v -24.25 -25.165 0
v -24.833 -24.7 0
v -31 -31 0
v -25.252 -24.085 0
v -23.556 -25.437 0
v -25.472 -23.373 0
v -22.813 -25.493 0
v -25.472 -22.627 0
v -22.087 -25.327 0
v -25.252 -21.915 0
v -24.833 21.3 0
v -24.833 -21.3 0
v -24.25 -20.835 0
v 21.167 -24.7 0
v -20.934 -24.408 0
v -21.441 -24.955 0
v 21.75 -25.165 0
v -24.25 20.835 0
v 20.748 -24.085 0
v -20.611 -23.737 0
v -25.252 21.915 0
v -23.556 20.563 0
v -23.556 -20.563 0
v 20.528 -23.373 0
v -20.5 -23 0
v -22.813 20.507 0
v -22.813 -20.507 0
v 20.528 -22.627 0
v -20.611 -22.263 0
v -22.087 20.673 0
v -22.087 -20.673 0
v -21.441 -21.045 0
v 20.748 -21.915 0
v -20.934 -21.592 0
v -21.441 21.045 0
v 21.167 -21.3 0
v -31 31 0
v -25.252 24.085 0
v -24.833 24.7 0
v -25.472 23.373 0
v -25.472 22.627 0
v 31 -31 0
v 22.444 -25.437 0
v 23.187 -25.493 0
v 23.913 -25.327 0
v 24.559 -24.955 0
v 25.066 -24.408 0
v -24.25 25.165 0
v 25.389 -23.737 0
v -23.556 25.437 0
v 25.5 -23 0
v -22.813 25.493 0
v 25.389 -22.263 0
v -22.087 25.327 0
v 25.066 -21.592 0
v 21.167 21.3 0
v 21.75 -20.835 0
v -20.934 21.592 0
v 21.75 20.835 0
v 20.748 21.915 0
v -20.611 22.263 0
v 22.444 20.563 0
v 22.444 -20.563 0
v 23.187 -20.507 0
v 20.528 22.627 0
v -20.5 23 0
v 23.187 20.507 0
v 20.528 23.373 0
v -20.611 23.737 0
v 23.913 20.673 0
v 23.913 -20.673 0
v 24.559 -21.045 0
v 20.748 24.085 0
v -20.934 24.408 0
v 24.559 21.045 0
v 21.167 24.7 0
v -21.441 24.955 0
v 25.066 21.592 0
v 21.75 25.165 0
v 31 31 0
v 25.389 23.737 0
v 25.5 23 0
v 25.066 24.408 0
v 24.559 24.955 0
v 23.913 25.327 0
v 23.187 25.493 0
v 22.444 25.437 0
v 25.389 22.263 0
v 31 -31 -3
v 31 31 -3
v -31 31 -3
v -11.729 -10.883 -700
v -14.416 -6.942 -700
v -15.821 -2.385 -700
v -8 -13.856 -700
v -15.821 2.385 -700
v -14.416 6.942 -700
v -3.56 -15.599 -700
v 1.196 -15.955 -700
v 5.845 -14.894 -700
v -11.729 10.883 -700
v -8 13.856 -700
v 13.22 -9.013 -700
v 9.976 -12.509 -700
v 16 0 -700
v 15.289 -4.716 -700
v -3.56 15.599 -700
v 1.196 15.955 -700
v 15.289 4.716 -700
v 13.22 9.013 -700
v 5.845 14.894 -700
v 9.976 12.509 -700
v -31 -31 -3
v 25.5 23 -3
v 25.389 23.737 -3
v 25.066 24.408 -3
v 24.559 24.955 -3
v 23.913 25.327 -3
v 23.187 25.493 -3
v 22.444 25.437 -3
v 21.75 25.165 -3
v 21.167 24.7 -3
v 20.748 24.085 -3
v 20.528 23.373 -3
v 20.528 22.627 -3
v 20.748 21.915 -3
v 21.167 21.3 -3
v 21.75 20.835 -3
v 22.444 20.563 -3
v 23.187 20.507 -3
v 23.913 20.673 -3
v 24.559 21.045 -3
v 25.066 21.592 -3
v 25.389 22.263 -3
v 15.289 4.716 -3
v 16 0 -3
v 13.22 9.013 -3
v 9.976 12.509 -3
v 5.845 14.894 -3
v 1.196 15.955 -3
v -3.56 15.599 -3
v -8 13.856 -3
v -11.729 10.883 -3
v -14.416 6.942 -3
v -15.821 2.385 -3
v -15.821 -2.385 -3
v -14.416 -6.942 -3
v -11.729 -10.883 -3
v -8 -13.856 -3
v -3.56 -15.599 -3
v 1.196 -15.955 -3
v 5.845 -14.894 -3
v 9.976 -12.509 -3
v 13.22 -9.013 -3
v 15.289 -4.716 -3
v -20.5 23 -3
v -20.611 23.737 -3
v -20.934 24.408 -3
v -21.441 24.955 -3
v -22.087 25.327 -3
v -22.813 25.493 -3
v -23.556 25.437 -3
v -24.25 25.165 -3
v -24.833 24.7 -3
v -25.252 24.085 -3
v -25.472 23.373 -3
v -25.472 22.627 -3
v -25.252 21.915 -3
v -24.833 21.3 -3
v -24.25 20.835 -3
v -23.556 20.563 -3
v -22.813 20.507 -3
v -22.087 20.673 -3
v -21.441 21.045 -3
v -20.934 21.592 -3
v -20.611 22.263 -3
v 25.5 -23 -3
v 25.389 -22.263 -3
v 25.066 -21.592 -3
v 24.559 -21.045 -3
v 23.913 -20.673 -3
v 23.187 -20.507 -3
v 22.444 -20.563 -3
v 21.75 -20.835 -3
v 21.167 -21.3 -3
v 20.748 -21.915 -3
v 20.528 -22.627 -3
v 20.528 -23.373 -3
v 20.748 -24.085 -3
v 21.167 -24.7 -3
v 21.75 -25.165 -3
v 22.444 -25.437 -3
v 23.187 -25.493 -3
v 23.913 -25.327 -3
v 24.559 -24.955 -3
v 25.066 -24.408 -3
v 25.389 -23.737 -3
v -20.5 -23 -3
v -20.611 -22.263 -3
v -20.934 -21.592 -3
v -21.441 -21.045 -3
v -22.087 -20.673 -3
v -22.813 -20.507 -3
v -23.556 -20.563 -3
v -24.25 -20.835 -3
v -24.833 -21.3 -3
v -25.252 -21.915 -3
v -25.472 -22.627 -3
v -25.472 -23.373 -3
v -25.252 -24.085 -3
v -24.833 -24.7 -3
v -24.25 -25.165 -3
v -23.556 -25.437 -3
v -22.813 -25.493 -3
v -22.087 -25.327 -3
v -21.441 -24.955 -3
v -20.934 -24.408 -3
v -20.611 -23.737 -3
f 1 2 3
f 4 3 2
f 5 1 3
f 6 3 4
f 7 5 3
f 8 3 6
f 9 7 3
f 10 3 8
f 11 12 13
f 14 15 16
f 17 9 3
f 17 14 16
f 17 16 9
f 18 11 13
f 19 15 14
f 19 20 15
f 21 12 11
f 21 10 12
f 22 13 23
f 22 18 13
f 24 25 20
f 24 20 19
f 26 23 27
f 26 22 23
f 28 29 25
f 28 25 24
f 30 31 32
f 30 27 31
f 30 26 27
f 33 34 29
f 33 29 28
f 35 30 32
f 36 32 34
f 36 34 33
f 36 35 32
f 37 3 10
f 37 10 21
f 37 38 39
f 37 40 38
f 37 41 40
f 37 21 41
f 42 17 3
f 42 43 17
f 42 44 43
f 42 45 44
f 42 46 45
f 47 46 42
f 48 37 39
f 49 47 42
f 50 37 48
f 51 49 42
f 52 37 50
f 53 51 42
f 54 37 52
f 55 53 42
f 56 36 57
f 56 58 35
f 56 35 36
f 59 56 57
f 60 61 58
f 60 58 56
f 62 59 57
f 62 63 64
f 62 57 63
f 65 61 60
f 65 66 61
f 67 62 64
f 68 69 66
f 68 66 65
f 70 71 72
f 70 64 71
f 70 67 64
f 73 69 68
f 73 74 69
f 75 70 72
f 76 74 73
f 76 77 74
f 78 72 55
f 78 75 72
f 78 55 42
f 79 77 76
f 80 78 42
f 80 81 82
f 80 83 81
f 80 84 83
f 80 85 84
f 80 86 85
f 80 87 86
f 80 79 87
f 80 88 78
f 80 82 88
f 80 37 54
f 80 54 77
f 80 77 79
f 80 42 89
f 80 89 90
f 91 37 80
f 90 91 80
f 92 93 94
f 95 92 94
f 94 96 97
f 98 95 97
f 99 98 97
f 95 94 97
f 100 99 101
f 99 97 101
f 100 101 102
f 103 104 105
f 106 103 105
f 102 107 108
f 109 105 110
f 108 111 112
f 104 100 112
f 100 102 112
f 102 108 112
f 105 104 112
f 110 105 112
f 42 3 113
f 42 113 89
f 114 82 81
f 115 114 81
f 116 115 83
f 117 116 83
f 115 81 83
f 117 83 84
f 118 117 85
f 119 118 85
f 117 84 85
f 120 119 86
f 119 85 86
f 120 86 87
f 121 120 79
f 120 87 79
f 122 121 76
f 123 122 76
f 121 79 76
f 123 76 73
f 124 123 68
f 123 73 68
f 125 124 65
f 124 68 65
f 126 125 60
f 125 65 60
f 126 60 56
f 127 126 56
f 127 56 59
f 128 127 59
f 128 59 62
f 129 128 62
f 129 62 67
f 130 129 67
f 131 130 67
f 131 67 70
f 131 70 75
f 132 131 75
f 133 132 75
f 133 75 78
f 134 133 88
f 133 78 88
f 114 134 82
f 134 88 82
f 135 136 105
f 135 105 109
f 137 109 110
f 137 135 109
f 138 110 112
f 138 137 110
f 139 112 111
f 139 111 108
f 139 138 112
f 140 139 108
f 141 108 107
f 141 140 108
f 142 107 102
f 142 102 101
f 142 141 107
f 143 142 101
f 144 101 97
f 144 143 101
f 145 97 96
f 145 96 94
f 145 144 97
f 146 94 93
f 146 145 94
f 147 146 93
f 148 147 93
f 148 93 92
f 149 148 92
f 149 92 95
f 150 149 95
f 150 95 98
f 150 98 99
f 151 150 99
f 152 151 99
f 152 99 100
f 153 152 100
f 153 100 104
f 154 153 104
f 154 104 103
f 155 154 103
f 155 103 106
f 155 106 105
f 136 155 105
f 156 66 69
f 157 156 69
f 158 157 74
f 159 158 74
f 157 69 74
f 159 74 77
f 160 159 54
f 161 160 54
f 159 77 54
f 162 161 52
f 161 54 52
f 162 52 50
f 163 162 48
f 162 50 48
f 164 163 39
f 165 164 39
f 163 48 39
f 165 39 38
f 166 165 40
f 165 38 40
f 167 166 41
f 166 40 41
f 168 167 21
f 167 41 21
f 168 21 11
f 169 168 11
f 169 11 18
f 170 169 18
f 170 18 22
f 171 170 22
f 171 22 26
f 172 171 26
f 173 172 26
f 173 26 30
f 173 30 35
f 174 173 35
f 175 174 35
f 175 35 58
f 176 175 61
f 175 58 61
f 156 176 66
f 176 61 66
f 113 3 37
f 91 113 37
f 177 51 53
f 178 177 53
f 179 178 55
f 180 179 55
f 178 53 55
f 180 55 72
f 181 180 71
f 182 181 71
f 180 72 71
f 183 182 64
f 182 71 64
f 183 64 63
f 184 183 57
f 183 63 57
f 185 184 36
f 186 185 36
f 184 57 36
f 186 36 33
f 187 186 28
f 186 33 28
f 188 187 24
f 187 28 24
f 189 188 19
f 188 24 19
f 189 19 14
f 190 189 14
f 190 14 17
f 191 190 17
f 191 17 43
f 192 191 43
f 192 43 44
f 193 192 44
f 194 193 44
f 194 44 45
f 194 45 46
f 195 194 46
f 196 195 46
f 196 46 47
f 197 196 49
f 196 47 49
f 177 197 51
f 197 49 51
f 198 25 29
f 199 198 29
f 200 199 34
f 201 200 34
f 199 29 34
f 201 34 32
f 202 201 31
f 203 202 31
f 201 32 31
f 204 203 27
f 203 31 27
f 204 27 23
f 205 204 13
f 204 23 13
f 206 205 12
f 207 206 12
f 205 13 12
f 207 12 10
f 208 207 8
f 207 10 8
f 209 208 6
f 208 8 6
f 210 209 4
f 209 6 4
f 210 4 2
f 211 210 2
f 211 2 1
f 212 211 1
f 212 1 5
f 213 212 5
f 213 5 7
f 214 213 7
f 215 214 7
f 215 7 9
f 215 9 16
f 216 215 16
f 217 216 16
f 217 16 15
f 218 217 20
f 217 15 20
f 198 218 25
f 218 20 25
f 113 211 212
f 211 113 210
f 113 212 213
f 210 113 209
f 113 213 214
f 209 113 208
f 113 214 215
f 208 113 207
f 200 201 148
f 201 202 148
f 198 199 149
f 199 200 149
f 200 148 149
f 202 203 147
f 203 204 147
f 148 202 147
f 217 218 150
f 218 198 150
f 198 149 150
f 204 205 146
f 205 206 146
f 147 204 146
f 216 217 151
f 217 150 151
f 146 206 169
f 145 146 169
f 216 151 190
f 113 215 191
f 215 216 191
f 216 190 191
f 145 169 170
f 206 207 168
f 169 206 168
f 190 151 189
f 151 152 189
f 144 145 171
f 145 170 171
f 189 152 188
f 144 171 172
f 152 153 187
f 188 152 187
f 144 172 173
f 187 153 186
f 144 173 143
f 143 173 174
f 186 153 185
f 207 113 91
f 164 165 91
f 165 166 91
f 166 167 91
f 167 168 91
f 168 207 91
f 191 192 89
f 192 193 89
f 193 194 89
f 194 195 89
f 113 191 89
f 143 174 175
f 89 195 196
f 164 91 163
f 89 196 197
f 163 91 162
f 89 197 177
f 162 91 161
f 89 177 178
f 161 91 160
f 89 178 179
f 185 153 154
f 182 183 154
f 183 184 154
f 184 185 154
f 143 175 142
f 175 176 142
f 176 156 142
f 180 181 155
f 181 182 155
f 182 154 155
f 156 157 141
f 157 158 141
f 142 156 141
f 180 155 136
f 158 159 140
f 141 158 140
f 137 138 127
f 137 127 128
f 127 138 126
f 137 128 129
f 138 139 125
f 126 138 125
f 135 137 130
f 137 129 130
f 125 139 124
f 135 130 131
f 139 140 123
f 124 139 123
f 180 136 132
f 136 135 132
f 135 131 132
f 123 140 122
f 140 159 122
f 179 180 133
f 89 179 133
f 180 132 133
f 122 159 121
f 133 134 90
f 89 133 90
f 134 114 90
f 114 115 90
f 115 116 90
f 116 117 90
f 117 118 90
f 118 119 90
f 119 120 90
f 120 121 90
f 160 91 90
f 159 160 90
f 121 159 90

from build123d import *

# Parameters (mm, degrees)
F0_R     = 16
F1_DEPTH = 700
F2_W     = 62
F2_H     = 62
F3_DEPTH = 3
F4_R     = 2.5
F5_DEPTH = 3


with BuildPart() as f1:
    # F0 (on Top) → F1 (new body)
    with BuildSketch(Plane.XY):
        Circle(F0_R)
    extrude(amount=-F1_DEPTH)

    # F2 (on Top) → F3 (join)
    with BuildSketch(Plane.XY):
        Rectangle(F2_W, F2_H)
    extrude(amount=-F3_DEPTH)

    # F4 (on Top) → F5 (cut, through all)
    with BuildSketch(Plane.XY):
        with Locations((-23, 23)):
            Circle(F4_R)
        with Locations((23, 23)):
            Circle(F4_R)
        with Locations((23, -23)):
            Circle(F4_R)
        with Locations((-23, -23)):
            Circle(F4_R)
    extrude(amount=-F5_DEPTH, mode=Mode.SUBTRACT)


solid = f1.part
